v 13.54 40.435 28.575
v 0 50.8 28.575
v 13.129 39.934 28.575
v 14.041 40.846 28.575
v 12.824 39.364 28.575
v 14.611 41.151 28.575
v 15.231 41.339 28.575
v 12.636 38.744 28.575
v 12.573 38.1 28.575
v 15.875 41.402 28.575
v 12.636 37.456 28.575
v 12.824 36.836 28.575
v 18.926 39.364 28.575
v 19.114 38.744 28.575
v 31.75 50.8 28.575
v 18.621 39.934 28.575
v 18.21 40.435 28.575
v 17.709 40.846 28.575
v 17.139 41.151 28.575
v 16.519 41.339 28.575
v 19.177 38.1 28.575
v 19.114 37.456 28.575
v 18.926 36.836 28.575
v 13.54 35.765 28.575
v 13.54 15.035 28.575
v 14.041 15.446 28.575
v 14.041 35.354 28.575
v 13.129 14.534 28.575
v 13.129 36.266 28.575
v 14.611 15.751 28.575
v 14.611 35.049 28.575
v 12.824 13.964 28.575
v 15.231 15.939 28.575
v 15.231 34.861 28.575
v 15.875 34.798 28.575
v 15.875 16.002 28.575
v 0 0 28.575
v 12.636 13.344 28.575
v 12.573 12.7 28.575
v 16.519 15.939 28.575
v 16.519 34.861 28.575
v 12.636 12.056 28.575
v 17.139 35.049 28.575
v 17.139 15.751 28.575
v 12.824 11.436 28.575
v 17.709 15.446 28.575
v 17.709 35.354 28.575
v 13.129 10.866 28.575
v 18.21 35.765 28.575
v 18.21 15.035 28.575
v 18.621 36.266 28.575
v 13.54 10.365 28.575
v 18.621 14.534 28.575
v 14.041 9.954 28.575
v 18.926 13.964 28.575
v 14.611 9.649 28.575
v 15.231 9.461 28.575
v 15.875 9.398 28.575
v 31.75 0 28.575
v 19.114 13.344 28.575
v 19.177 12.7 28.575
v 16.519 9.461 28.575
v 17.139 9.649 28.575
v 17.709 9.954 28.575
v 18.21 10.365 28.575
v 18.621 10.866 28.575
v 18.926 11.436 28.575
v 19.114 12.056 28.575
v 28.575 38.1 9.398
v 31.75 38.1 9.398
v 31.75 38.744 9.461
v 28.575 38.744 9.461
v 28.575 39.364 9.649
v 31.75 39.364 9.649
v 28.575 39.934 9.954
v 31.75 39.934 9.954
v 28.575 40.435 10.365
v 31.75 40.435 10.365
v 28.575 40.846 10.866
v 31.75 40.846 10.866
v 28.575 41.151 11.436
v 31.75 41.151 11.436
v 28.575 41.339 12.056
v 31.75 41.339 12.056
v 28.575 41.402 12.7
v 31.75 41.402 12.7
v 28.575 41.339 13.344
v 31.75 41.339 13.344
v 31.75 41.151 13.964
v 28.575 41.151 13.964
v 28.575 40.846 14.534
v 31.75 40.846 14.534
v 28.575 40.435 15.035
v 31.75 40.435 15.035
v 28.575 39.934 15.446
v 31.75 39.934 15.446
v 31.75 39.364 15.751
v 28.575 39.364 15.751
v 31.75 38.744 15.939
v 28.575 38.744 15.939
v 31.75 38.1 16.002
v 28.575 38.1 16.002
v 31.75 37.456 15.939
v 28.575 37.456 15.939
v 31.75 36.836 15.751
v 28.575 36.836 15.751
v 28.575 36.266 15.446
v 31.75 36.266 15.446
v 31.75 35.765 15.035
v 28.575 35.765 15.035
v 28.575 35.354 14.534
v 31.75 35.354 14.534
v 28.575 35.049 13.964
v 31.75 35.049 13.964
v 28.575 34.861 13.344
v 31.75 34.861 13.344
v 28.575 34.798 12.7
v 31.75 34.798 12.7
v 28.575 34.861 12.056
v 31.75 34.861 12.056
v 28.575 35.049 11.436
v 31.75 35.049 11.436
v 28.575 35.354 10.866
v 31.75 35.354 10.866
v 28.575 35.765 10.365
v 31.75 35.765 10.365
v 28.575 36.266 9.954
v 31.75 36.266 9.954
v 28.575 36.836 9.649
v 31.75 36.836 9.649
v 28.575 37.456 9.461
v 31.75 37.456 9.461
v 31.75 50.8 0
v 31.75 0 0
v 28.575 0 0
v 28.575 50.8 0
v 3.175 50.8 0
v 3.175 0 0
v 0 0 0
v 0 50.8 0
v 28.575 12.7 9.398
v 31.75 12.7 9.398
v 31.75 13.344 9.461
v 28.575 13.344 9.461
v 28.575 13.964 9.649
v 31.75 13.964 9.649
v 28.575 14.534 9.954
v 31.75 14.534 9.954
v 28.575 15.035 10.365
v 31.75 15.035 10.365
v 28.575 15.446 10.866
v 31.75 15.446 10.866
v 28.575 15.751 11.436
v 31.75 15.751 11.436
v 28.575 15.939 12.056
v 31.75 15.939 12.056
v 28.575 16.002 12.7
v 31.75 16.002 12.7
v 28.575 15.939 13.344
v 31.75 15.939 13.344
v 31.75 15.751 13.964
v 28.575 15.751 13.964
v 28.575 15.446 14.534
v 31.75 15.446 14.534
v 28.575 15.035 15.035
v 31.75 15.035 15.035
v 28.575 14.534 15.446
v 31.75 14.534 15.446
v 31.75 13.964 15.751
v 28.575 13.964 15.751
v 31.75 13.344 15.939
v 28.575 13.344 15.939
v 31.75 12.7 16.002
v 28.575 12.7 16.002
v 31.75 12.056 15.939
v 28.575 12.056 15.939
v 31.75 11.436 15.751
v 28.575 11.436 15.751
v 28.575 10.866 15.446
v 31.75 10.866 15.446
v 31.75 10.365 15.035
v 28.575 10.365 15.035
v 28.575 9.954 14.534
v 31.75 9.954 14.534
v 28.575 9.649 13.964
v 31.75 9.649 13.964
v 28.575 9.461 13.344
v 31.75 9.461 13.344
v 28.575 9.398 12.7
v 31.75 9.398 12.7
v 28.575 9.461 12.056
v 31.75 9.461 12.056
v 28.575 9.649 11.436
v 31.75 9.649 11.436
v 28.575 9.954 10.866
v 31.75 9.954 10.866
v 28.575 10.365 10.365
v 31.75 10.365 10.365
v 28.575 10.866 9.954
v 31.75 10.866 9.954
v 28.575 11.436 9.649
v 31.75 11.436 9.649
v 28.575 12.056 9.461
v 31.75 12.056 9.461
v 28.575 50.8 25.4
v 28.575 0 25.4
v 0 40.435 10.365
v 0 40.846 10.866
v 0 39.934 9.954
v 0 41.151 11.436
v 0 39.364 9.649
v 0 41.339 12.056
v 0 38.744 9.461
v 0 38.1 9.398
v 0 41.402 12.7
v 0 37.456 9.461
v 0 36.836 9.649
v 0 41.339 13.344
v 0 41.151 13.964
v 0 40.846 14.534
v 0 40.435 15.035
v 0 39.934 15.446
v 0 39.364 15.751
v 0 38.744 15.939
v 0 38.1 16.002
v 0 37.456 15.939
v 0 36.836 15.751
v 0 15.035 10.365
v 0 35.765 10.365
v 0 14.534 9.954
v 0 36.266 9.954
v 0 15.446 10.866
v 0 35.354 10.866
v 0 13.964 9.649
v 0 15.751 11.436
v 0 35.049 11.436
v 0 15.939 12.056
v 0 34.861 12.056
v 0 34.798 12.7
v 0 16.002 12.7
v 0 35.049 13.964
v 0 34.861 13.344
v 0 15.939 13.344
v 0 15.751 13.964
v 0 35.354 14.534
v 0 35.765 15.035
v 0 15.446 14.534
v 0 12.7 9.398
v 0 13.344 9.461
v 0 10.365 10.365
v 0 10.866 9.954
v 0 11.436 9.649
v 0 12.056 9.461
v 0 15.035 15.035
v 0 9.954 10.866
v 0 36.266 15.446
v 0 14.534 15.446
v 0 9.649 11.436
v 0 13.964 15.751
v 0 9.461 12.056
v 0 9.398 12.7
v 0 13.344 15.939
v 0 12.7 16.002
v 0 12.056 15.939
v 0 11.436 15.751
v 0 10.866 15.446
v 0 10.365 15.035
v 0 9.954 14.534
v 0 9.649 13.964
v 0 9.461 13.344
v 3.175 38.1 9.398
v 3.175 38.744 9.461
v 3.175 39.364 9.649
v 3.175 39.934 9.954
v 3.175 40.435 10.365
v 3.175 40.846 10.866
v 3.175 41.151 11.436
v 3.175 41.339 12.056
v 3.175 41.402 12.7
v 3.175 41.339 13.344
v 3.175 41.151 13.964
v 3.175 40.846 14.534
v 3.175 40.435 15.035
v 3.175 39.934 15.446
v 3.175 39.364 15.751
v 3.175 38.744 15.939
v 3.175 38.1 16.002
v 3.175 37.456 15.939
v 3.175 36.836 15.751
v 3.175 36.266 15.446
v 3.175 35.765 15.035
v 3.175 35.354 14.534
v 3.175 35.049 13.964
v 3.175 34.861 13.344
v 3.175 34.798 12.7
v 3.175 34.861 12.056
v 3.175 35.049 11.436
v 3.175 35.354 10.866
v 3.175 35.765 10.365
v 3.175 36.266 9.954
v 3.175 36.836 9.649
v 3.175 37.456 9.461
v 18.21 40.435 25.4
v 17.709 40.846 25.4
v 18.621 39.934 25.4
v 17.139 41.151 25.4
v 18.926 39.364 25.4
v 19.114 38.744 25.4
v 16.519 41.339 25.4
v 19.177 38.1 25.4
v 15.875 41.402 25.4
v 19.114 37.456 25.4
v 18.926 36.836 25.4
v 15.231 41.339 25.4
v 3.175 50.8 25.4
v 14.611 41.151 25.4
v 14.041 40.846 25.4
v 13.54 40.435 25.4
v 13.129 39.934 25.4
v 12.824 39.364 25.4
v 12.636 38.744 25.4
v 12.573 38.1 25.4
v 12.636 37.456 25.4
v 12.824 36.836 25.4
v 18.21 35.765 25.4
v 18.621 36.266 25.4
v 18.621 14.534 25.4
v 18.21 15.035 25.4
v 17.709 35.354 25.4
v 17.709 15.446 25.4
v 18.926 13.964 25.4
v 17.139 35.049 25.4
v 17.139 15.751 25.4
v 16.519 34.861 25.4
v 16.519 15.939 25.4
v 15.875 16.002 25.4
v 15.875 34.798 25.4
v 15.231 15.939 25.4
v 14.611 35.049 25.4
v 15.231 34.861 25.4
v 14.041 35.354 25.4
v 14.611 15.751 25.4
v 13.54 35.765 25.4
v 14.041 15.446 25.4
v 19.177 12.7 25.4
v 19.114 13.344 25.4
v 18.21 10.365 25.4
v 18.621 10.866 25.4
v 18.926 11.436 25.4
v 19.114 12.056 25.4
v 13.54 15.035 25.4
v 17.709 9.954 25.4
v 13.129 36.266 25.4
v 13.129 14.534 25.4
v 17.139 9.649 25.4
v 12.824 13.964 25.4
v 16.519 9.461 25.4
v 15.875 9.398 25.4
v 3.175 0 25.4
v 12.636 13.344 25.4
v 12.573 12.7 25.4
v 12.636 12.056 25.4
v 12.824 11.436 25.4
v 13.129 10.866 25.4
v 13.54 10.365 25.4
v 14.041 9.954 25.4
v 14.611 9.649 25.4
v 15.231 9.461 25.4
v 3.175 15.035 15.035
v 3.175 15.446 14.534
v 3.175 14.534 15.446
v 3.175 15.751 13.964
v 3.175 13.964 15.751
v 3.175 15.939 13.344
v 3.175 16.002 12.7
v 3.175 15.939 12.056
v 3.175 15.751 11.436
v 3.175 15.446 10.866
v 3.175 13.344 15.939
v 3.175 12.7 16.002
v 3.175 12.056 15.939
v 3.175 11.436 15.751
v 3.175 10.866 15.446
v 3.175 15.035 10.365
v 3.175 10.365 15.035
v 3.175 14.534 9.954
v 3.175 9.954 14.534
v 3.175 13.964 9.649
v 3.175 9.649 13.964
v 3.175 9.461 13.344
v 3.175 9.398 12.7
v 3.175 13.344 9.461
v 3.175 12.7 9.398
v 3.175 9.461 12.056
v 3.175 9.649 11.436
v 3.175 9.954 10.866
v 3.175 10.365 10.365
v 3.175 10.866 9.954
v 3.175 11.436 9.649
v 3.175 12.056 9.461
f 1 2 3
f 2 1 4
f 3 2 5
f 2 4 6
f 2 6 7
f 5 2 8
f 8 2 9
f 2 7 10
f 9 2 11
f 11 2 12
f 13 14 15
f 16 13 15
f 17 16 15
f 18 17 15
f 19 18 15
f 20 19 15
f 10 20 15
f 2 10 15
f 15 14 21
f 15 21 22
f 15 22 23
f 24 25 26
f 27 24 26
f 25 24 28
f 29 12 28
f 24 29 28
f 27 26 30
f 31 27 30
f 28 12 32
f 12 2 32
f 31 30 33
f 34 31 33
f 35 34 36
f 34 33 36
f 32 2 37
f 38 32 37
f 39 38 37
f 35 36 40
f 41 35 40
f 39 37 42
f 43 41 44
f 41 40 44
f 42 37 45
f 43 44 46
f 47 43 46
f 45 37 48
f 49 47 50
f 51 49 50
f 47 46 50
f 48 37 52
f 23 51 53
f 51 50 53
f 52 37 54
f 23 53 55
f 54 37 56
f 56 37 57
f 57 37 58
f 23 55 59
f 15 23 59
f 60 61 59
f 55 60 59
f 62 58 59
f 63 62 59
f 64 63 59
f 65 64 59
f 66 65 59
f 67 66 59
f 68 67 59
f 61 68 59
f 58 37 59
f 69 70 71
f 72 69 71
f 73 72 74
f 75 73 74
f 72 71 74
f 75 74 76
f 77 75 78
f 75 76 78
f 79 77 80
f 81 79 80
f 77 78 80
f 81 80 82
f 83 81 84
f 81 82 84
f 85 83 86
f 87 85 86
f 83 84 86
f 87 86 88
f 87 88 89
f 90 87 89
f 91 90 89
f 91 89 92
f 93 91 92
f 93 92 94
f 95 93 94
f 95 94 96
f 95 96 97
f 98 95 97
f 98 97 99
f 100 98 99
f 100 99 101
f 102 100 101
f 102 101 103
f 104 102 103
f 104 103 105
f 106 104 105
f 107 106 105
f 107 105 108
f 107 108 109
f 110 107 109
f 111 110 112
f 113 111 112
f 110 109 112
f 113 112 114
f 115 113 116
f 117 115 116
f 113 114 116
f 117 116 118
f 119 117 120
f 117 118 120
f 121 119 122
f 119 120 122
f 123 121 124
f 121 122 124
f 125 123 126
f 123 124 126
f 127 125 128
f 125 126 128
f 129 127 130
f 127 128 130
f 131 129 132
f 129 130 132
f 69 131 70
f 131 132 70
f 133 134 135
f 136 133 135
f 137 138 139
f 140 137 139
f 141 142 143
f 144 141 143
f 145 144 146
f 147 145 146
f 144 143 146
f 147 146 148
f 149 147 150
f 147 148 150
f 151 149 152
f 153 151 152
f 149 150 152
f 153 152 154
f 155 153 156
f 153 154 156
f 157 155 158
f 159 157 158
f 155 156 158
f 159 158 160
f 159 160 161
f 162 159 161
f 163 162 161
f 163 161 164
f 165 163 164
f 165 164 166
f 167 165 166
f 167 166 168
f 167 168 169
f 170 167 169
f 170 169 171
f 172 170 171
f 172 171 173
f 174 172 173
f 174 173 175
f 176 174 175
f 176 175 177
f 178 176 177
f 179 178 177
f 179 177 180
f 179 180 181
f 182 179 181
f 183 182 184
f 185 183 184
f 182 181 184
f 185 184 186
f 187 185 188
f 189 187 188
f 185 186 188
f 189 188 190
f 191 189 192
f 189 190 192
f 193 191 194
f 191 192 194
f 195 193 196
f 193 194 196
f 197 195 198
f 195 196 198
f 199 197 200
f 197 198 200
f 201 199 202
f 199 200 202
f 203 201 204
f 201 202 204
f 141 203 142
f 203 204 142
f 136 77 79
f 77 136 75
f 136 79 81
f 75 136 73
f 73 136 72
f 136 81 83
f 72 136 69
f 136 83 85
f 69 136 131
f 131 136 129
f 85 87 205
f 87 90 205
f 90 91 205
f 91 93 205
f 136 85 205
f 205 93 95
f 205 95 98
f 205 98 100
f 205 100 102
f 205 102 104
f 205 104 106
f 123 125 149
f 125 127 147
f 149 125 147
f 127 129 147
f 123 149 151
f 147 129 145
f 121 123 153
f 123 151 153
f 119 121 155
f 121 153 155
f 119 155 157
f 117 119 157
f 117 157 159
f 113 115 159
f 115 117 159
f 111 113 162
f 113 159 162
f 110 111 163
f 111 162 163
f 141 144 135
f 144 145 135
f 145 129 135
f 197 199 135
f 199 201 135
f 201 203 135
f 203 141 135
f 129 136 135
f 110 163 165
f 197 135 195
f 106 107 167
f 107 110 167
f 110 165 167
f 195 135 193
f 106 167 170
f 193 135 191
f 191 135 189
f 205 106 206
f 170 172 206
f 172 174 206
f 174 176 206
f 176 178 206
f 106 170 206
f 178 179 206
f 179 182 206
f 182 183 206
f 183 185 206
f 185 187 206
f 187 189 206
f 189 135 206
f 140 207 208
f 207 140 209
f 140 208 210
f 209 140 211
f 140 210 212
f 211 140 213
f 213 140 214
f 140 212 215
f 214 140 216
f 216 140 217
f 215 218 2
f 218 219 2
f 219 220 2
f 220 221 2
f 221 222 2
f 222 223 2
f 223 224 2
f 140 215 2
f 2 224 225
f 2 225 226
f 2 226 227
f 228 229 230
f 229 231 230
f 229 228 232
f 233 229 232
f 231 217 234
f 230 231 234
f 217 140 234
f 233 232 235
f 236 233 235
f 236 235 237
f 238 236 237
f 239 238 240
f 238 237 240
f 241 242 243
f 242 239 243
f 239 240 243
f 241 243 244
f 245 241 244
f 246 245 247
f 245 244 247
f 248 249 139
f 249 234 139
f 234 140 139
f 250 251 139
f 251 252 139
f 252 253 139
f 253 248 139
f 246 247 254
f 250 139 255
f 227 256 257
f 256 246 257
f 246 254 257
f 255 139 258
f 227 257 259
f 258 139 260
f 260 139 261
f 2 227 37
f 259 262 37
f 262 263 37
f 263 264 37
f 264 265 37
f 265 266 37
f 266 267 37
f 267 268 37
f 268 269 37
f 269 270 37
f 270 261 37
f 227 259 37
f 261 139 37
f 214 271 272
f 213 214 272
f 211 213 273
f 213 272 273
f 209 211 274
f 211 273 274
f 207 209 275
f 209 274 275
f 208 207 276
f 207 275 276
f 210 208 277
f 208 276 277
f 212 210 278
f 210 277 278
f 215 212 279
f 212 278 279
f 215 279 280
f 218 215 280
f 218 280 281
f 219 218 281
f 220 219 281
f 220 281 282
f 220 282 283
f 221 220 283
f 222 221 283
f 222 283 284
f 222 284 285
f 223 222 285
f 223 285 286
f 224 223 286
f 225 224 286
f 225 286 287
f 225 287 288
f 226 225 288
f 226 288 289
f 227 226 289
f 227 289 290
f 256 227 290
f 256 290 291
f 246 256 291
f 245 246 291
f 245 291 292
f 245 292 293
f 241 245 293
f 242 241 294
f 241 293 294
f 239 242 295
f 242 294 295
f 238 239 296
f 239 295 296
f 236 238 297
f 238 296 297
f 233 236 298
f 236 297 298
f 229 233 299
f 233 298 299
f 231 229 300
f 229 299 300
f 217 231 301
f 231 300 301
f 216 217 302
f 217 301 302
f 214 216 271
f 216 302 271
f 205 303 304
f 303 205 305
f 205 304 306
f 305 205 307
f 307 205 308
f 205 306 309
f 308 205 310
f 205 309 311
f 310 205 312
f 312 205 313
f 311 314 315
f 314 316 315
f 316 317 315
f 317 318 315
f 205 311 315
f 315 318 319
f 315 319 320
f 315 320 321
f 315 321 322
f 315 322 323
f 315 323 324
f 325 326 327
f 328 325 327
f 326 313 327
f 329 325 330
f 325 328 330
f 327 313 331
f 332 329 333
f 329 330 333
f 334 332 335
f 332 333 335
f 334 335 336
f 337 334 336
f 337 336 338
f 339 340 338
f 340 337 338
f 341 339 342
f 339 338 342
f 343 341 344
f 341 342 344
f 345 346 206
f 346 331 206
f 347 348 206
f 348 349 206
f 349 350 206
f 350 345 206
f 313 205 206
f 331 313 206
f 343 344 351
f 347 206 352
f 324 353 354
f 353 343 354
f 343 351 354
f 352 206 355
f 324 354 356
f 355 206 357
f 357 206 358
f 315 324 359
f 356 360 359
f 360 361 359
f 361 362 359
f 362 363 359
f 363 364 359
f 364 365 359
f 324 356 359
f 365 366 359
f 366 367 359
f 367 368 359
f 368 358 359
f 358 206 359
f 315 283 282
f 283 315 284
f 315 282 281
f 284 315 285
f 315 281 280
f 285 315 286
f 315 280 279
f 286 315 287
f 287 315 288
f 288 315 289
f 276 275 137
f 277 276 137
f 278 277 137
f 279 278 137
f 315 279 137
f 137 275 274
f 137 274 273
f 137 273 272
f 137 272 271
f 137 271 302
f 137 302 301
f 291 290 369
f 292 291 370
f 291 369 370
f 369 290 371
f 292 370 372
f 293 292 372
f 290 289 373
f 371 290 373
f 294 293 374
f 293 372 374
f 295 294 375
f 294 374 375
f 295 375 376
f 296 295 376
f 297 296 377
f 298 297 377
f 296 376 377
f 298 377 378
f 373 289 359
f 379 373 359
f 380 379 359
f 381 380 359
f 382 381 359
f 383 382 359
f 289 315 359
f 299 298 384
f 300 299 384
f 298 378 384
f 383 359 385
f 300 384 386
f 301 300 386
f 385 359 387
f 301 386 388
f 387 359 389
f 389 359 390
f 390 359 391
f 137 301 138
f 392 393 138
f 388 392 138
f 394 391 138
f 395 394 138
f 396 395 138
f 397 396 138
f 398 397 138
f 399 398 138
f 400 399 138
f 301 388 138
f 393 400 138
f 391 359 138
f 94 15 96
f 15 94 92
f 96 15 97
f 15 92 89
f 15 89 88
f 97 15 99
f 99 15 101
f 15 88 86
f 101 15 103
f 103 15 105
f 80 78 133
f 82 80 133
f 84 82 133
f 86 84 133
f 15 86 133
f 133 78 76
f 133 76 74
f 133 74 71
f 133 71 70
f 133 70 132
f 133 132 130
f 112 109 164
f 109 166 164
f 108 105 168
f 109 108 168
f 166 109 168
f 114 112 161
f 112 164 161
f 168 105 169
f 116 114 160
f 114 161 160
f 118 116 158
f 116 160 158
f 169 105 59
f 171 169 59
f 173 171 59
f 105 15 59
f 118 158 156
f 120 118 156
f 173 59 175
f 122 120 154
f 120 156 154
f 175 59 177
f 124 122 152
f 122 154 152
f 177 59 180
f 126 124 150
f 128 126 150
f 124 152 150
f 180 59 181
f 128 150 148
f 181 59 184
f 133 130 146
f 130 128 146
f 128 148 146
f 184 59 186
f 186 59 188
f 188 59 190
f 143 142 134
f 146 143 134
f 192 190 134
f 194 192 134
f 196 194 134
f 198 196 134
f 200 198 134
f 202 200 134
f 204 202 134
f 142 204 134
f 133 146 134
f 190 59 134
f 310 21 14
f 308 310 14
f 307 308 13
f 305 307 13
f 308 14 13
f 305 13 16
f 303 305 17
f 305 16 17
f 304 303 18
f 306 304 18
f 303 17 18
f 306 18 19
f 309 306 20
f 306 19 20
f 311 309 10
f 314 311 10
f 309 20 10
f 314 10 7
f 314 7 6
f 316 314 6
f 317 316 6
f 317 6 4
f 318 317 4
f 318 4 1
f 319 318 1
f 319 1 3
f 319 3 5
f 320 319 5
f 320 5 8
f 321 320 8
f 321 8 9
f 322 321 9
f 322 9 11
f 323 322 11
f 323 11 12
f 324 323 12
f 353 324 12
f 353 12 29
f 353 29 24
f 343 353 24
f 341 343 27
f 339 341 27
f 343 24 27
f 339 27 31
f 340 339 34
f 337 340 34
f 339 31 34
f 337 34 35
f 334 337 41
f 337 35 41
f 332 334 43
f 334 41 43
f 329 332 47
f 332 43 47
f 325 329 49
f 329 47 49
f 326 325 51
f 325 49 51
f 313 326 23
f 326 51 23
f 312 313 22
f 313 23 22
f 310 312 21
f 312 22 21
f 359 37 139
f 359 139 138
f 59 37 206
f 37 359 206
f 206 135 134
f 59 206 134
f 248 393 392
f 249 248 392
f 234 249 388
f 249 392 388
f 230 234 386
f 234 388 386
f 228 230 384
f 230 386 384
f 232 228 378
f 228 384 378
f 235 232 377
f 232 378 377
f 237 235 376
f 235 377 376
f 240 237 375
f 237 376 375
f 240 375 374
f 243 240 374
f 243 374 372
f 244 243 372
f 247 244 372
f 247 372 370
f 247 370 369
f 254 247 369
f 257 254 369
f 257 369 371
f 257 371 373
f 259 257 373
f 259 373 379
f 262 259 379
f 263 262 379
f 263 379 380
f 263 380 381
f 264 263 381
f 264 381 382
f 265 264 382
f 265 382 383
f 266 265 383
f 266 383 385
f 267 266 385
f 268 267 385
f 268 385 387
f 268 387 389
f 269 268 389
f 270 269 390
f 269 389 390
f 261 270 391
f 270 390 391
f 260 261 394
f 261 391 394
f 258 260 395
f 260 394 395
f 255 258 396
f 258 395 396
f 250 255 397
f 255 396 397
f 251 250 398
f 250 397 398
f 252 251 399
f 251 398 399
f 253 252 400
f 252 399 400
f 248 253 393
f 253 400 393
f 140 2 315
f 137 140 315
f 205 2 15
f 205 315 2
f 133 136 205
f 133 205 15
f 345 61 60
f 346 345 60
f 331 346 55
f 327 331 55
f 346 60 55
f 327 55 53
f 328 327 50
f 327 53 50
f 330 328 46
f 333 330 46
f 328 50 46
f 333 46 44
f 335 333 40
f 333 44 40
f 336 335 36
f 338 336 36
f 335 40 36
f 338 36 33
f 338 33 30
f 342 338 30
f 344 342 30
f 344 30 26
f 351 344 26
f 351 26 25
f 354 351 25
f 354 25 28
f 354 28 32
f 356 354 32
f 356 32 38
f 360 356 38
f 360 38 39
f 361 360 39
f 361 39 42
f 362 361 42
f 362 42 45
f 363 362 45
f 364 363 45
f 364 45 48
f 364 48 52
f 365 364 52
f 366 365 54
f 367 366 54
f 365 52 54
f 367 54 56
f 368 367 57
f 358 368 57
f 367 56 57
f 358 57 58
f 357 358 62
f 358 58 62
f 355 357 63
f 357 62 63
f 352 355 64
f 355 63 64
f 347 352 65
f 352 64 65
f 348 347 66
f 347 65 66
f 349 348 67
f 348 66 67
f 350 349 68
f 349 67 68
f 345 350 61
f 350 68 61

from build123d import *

# Parameters (mm, degrees)
BOSS_EXTRUDE1_DEPTH = 50.8
CUT_EXTRUDE1_REACH  = 68.372
SKETCH2_R           = 3.302
SKETCH3_R           = 3.302
CUT_EXTRUDE2_DEPTH  = 67.371930249


with BuildPart() as part:
    # Sketch1 → Boss-Extrude1 (new body)
    with BuildSketch(Plane(origin=(0, 0, 0), x_dir=(1, 0, 0), z_dir=(0, 1, 0))):
        Polygon((0, 0), (0, -28.575), (31.75, -28.575), (31.75, 0), (28.575, 0), (28.575, -25.4), (3.175, -25.4), (3.175, 0), align=None)
    extrude(amount=BOSS_EXTRUDE1_DEPTH)

    # Sketch2 → Cut-Extrude1 (cut, up to next)
    with BuildSketch(Plane.XY.offset(28.575), mode=Mode.PRIVATE) as cut_extrude1_sk1:
        with Locations((15.875, 38.1)):
            Circle(SKETCH2_R)
    cut_extrude1_tool1 = extrude(cut_extrude1_sk1.sketch, amount=-CUT_EXTRUDE1_REACH, mode=Mode.PRIVATE) & part.part
    # Sketch2 → Cut-Extrude1 (cut, up to next)
    with BuildSketch(Plane.XY.offset(28.575), mode=Mode.PRIVATE) as cut_extrude1_sk2:
        with Locations((15.875, 12.7)):
            Circle(SKETCH2_R)
    cut_extrude1_tool2 = extrude(cut_extrude1_sk2.sketch, amount=-CUT_EXTRUDE1_REACH, mode=Mode.PRIVATE) & part.part
    add(cut_extrude1_tool1.solids().sort_by_distance((15.875, 38.1, 28.575))[0], mode=Mode.SUBTRACT)
    add(cut_extrude1_tool2.solids().sort_by_distance((15.875, 12.7, 28.575))[0], mode=Mode.SUBTRACT)

    # Sketch3 → Cut-Extrude2 (cut, through all)
    with BuildSketch(Plane(origin=(31.75, 0, 0), x_dir=(0, 0, -1), z_dir=(1, 0, 0))):
        with Locations((-12.7, 38.1)):
            Circle(SKETCH3_R)
        with Locations((-12.7, 12.7)):
            Circle(SKETCH3_R)
    extrude(amount=-CUT_EXTRUDE2_DEPTH, mode=Mode.SUBTRACT)


solid = part.part
